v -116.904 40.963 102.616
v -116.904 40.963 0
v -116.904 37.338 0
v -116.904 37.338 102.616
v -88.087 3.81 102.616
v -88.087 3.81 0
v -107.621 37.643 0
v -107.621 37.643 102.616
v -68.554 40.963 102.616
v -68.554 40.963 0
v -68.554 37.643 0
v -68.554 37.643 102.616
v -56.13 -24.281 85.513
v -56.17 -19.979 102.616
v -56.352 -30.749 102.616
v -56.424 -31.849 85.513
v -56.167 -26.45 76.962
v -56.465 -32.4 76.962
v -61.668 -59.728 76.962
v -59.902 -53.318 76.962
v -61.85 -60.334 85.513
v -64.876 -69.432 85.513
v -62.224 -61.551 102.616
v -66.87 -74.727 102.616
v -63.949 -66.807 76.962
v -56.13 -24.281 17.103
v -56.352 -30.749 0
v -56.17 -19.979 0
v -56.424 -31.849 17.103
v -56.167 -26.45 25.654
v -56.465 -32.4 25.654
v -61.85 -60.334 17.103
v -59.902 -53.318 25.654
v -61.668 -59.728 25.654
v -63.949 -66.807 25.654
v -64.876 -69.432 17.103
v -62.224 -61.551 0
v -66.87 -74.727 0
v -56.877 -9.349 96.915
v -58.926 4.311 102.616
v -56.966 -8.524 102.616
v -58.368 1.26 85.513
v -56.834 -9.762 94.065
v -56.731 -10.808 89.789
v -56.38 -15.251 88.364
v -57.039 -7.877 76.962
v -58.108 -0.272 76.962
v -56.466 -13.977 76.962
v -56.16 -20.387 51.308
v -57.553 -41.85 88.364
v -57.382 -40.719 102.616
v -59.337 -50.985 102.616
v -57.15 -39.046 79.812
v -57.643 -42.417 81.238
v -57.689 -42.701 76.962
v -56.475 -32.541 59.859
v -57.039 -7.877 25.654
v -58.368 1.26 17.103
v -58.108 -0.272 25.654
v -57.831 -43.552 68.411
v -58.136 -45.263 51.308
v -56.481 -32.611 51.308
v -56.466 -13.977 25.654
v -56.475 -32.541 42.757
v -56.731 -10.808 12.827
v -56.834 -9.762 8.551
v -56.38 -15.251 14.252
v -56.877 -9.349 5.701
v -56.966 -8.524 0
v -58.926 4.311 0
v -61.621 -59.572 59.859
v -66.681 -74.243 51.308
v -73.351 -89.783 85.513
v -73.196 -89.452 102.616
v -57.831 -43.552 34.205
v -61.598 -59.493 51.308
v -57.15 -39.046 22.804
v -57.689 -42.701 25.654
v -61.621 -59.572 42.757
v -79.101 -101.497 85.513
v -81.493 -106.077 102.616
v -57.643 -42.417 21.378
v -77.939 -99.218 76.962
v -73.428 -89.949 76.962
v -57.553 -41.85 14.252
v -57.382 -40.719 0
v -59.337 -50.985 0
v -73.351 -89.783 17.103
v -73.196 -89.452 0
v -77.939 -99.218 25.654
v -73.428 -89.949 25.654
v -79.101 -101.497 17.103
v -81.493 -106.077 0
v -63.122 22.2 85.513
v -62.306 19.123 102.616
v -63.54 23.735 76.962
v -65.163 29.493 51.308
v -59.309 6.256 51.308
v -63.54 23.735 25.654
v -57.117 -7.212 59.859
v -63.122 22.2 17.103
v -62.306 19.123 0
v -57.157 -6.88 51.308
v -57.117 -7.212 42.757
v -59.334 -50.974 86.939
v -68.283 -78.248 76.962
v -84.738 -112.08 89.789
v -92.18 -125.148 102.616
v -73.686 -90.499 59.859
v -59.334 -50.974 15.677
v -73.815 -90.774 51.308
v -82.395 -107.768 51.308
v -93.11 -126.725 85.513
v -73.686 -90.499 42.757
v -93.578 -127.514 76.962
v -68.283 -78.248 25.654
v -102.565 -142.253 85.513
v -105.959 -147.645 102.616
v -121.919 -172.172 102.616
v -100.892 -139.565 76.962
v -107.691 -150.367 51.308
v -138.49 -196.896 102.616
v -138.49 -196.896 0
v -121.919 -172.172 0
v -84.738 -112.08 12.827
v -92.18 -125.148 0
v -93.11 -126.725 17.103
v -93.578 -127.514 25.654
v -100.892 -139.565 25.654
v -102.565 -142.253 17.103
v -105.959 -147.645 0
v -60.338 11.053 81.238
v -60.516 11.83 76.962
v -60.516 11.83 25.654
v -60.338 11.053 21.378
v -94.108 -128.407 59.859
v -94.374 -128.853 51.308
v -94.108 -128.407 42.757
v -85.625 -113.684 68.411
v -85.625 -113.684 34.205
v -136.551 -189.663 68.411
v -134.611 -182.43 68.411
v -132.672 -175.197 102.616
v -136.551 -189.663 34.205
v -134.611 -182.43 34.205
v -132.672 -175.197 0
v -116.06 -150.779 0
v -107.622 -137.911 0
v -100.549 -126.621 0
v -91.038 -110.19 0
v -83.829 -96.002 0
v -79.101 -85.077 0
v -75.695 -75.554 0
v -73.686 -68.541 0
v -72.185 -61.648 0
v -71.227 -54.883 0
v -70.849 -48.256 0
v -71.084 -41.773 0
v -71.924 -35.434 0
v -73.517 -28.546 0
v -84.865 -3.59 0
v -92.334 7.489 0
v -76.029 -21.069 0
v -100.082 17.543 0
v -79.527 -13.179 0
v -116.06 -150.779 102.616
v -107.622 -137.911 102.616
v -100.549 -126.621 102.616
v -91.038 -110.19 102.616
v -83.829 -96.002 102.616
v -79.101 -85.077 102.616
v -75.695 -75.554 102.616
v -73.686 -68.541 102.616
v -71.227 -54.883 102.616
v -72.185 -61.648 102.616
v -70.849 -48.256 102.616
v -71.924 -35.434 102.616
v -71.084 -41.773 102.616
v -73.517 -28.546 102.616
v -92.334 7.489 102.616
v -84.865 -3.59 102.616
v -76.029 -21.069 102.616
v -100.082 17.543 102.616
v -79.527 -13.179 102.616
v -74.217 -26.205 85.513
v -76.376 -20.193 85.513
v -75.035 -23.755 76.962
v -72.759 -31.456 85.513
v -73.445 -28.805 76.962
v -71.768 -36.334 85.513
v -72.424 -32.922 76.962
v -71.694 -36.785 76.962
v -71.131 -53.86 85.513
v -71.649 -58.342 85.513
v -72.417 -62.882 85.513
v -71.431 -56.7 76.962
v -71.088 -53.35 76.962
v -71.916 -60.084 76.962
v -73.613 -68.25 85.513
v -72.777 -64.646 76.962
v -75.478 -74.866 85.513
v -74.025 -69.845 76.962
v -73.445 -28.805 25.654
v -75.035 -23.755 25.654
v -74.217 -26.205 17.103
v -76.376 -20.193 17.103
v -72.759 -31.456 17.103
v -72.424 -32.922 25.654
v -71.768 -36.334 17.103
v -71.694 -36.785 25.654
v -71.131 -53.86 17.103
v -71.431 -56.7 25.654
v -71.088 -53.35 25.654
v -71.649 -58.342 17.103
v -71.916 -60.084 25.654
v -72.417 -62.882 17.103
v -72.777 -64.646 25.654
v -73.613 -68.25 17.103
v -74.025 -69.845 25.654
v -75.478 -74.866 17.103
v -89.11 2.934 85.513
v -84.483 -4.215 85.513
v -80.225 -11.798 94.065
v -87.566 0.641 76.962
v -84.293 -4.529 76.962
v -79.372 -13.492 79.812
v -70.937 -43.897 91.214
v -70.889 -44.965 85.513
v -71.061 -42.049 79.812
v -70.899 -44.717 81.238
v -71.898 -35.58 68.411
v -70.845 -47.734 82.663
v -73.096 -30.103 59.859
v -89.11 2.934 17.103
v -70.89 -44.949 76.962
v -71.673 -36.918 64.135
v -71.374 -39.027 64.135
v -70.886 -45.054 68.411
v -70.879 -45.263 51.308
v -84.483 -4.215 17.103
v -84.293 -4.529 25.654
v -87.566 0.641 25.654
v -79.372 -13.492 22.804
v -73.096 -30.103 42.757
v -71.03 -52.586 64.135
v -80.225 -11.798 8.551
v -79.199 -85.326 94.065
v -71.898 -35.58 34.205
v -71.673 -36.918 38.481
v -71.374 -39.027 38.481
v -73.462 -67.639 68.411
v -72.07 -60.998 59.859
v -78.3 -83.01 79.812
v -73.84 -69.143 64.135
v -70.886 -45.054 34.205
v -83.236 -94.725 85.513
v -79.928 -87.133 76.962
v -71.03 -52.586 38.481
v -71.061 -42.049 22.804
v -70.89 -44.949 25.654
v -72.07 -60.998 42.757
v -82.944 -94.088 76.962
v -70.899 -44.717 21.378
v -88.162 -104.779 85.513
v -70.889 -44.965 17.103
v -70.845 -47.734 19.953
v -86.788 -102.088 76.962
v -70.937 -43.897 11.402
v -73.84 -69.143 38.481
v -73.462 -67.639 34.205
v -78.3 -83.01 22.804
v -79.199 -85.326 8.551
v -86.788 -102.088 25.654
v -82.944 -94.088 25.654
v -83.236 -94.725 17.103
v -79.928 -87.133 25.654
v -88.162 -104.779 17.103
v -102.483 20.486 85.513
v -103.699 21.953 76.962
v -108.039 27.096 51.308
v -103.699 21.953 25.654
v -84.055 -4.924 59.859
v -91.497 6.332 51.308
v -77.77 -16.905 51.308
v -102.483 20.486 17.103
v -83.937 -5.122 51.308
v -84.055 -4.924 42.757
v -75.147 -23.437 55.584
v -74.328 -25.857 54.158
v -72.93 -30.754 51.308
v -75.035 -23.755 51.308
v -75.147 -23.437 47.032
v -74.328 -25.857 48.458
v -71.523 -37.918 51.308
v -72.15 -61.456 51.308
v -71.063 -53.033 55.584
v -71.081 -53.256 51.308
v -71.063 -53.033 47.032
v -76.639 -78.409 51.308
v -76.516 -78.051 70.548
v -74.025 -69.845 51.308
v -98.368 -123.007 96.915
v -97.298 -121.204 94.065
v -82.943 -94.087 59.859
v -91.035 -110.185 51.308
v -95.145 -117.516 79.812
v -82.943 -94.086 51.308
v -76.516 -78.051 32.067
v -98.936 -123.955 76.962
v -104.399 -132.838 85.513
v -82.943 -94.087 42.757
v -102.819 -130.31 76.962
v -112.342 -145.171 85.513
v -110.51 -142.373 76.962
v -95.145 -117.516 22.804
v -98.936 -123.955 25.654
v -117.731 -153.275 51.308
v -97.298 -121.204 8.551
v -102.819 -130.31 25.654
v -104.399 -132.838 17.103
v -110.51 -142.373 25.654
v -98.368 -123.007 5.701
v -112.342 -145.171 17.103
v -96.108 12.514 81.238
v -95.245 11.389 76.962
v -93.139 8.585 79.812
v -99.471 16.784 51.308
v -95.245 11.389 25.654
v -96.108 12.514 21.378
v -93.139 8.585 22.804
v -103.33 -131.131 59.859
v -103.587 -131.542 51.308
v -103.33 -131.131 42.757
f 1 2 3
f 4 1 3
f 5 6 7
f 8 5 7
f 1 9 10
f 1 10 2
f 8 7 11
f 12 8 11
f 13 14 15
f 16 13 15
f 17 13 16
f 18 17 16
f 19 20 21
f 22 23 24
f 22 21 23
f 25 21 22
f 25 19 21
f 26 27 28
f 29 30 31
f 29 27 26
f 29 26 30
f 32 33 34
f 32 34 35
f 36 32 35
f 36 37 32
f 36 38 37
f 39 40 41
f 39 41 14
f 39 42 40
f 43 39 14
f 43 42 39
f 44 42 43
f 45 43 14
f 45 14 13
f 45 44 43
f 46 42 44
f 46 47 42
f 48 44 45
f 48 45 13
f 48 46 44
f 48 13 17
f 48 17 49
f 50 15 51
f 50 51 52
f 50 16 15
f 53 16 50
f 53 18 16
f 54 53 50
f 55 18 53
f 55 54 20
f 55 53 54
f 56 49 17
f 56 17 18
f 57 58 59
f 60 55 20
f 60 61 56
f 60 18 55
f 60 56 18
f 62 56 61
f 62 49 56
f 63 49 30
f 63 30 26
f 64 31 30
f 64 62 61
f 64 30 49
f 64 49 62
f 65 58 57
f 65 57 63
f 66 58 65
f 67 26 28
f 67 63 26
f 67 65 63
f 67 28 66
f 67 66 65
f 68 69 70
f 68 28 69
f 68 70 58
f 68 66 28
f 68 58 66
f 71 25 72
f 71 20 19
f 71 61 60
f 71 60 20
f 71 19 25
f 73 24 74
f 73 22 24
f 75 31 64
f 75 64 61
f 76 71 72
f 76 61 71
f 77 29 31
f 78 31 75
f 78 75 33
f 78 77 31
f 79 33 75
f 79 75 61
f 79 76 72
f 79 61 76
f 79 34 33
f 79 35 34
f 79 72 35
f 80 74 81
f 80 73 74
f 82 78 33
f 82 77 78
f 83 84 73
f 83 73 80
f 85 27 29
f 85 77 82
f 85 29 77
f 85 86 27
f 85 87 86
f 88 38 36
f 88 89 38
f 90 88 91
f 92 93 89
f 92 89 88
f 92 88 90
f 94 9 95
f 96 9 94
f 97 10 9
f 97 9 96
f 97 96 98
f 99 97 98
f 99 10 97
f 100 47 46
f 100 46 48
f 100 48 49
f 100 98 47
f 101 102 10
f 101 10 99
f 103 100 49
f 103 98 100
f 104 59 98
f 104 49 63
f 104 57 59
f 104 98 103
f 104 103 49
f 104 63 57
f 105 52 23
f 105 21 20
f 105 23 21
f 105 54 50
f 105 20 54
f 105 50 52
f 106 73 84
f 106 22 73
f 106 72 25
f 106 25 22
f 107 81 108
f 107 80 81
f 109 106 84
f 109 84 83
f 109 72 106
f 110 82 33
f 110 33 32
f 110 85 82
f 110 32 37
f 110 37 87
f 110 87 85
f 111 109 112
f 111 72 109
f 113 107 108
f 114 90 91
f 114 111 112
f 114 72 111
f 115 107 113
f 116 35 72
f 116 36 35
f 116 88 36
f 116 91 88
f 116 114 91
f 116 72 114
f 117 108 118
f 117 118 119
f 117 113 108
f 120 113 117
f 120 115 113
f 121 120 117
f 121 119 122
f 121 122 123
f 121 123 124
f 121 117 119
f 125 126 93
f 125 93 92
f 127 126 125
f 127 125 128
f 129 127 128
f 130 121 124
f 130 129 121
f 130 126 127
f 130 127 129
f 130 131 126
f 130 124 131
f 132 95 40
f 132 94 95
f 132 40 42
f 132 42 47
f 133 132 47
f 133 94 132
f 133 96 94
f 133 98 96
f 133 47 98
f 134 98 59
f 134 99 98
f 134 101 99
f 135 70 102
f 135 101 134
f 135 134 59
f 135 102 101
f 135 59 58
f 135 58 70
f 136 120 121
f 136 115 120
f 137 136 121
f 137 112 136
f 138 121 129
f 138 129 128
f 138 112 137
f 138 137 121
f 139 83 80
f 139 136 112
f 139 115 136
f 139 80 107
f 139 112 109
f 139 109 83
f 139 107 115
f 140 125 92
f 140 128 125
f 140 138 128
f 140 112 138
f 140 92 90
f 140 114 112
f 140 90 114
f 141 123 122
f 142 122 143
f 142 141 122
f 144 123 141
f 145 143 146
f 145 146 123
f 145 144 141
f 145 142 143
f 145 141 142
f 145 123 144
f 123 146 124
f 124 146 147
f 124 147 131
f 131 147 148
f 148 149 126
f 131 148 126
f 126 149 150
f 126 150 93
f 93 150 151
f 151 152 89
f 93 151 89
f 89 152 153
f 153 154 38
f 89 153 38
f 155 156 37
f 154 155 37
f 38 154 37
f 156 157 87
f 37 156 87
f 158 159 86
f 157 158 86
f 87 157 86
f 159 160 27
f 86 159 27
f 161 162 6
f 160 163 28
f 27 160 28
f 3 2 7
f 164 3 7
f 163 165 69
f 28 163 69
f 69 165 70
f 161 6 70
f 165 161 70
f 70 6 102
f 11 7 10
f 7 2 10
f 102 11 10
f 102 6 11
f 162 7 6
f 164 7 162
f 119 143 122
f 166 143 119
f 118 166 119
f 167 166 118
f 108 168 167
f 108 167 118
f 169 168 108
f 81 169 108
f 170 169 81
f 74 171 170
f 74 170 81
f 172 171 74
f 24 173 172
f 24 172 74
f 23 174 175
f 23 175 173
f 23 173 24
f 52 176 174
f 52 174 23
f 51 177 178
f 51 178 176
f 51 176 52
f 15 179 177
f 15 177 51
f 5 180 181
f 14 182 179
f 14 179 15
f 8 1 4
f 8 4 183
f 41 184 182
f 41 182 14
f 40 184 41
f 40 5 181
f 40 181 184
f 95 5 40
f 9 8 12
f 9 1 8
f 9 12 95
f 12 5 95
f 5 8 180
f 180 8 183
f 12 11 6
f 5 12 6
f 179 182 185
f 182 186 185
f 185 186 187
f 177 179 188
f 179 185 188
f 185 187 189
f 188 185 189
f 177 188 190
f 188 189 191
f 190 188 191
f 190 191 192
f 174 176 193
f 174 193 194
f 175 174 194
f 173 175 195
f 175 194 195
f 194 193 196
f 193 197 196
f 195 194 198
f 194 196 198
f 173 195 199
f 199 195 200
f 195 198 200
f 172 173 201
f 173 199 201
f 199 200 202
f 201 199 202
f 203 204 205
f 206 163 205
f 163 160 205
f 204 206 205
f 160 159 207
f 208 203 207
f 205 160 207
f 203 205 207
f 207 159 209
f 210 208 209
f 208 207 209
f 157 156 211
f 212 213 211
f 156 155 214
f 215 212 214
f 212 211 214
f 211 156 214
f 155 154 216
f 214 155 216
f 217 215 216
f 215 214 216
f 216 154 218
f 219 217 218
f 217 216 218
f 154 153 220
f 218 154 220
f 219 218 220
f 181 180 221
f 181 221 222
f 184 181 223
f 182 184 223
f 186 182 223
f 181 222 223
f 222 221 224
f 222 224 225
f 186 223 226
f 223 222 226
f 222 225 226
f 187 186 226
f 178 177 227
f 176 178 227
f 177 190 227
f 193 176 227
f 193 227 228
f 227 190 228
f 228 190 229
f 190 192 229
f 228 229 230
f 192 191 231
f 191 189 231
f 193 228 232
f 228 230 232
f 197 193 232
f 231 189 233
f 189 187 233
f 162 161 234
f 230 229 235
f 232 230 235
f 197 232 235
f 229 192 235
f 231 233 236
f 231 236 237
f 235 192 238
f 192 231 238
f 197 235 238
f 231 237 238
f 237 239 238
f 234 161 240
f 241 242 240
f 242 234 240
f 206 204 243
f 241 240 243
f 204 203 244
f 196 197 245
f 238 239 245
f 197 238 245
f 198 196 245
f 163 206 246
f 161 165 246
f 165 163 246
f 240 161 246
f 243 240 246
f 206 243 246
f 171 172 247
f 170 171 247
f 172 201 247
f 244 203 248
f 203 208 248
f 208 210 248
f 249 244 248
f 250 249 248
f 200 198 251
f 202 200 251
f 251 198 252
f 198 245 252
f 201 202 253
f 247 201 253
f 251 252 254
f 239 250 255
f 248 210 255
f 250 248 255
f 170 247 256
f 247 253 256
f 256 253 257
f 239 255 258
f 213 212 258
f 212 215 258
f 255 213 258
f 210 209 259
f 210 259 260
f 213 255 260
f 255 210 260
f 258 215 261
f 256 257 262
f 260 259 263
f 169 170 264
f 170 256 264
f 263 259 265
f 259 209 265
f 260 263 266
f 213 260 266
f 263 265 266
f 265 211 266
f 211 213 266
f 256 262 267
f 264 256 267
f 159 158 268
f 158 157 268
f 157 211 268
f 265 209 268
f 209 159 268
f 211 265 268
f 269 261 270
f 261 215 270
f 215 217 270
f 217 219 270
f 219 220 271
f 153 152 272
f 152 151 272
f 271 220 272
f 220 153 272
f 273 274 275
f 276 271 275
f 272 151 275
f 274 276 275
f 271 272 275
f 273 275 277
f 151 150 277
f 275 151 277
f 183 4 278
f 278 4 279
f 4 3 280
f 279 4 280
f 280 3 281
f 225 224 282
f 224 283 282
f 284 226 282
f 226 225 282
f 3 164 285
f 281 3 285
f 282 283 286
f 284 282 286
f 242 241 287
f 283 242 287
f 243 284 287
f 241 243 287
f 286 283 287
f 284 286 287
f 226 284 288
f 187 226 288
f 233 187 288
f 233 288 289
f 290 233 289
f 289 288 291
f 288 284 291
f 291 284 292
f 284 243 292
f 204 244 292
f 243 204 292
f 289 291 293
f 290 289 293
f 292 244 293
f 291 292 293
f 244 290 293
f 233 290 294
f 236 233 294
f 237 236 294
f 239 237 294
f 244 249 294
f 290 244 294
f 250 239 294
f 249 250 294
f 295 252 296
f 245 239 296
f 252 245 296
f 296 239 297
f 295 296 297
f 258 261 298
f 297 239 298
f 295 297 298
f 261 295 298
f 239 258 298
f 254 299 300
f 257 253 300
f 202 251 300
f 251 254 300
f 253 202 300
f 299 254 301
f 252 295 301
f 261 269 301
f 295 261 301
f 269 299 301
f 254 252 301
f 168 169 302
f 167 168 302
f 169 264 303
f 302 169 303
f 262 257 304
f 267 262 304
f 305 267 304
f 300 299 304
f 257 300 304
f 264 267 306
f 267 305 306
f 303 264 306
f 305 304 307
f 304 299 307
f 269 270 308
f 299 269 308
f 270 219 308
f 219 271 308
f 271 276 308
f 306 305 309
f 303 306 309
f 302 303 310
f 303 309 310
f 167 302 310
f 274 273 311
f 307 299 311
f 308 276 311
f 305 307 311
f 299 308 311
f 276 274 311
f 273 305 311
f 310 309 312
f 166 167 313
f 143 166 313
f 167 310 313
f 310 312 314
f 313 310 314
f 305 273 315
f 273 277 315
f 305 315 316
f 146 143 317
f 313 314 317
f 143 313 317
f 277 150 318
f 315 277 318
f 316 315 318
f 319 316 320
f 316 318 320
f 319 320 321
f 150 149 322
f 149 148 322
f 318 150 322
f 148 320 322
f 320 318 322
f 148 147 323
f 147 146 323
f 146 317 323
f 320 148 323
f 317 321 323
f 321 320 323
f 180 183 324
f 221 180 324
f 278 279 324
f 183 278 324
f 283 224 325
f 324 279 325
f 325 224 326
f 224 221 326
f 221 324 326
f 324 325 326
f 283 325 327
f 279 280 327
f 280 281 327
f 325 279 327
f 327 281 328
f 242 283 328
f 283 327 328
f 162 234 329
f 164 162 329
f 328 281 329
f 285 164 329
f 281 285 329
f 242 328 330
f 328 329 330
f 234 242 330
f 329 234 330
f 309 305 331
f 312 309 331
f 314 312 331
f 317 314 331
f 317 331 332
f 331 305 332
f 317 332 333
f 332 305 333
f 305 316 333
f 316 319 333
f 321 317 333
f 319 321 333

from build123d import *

# Parameters (mm, degrees)
F4_DEPTH = 102.616


# Not quite as in the source:
# - a feature of the source that left no trace in its solid (it failed there, or was rolled back) is left out


with BuildPart() as f4:
    # F3 (on Top) → F4 (new body)
    with BuildSketch(Plane.XY):
        with BuildLine():
            Line((-116.903886199, 40.9632176161), (-116.903886199, 37.3379997909))
            add(Edge.make_bspline(
                [(-116.903886199, 37.3379997909), (-94.3898521159, 11.5008250837), (-44.1040481936, -46.2073180434), (-101.1608146078, -129.3041537381), (-132.6720416546, -175.1967519522)],
                knots=[0, 0, 0, 0, 0.4477214706, 1, 1, 1, 1], degree=3))
            add(Edge.make_bspline(
                [(-138.4897381067, -196.8956440687), (-136.550505956, -189.6626800299), (-134.6112738053, -182.429715991), (-132.6720416546, -175.1967519522)],
                knots=[0, 0, 0, 0, 22.4652511914, 22.4652511914, 22.4652511914, 22.4652511914], degree=3))
            add(Edge.make_bspline(
                [(-68.5538262124, 40.9632176161), (-60.3988212358, 13.7210225854), (-40.7807645704, -51.8140601445), (-102.453603187, -143.3879738574), (-138.4897381067, -196.8956440687)],
                knots=[0, 0, 0, 0, 0.4156887257, 1, 1, 1, 1], degree=3))
            Line((-68.5538262124, 40.9632176161), (-116.903886199, 40.9632176161))
        make_face()
        Polygon((-88.0872011185, 3.8100015372), (-107.6205760246, 37.6427993178), (-68.5538262124, 37.6427993178), align=None, mode=Mode.SUBTRACT)
    extrude(amount=F4_DEPTH)


solid = f4.part
